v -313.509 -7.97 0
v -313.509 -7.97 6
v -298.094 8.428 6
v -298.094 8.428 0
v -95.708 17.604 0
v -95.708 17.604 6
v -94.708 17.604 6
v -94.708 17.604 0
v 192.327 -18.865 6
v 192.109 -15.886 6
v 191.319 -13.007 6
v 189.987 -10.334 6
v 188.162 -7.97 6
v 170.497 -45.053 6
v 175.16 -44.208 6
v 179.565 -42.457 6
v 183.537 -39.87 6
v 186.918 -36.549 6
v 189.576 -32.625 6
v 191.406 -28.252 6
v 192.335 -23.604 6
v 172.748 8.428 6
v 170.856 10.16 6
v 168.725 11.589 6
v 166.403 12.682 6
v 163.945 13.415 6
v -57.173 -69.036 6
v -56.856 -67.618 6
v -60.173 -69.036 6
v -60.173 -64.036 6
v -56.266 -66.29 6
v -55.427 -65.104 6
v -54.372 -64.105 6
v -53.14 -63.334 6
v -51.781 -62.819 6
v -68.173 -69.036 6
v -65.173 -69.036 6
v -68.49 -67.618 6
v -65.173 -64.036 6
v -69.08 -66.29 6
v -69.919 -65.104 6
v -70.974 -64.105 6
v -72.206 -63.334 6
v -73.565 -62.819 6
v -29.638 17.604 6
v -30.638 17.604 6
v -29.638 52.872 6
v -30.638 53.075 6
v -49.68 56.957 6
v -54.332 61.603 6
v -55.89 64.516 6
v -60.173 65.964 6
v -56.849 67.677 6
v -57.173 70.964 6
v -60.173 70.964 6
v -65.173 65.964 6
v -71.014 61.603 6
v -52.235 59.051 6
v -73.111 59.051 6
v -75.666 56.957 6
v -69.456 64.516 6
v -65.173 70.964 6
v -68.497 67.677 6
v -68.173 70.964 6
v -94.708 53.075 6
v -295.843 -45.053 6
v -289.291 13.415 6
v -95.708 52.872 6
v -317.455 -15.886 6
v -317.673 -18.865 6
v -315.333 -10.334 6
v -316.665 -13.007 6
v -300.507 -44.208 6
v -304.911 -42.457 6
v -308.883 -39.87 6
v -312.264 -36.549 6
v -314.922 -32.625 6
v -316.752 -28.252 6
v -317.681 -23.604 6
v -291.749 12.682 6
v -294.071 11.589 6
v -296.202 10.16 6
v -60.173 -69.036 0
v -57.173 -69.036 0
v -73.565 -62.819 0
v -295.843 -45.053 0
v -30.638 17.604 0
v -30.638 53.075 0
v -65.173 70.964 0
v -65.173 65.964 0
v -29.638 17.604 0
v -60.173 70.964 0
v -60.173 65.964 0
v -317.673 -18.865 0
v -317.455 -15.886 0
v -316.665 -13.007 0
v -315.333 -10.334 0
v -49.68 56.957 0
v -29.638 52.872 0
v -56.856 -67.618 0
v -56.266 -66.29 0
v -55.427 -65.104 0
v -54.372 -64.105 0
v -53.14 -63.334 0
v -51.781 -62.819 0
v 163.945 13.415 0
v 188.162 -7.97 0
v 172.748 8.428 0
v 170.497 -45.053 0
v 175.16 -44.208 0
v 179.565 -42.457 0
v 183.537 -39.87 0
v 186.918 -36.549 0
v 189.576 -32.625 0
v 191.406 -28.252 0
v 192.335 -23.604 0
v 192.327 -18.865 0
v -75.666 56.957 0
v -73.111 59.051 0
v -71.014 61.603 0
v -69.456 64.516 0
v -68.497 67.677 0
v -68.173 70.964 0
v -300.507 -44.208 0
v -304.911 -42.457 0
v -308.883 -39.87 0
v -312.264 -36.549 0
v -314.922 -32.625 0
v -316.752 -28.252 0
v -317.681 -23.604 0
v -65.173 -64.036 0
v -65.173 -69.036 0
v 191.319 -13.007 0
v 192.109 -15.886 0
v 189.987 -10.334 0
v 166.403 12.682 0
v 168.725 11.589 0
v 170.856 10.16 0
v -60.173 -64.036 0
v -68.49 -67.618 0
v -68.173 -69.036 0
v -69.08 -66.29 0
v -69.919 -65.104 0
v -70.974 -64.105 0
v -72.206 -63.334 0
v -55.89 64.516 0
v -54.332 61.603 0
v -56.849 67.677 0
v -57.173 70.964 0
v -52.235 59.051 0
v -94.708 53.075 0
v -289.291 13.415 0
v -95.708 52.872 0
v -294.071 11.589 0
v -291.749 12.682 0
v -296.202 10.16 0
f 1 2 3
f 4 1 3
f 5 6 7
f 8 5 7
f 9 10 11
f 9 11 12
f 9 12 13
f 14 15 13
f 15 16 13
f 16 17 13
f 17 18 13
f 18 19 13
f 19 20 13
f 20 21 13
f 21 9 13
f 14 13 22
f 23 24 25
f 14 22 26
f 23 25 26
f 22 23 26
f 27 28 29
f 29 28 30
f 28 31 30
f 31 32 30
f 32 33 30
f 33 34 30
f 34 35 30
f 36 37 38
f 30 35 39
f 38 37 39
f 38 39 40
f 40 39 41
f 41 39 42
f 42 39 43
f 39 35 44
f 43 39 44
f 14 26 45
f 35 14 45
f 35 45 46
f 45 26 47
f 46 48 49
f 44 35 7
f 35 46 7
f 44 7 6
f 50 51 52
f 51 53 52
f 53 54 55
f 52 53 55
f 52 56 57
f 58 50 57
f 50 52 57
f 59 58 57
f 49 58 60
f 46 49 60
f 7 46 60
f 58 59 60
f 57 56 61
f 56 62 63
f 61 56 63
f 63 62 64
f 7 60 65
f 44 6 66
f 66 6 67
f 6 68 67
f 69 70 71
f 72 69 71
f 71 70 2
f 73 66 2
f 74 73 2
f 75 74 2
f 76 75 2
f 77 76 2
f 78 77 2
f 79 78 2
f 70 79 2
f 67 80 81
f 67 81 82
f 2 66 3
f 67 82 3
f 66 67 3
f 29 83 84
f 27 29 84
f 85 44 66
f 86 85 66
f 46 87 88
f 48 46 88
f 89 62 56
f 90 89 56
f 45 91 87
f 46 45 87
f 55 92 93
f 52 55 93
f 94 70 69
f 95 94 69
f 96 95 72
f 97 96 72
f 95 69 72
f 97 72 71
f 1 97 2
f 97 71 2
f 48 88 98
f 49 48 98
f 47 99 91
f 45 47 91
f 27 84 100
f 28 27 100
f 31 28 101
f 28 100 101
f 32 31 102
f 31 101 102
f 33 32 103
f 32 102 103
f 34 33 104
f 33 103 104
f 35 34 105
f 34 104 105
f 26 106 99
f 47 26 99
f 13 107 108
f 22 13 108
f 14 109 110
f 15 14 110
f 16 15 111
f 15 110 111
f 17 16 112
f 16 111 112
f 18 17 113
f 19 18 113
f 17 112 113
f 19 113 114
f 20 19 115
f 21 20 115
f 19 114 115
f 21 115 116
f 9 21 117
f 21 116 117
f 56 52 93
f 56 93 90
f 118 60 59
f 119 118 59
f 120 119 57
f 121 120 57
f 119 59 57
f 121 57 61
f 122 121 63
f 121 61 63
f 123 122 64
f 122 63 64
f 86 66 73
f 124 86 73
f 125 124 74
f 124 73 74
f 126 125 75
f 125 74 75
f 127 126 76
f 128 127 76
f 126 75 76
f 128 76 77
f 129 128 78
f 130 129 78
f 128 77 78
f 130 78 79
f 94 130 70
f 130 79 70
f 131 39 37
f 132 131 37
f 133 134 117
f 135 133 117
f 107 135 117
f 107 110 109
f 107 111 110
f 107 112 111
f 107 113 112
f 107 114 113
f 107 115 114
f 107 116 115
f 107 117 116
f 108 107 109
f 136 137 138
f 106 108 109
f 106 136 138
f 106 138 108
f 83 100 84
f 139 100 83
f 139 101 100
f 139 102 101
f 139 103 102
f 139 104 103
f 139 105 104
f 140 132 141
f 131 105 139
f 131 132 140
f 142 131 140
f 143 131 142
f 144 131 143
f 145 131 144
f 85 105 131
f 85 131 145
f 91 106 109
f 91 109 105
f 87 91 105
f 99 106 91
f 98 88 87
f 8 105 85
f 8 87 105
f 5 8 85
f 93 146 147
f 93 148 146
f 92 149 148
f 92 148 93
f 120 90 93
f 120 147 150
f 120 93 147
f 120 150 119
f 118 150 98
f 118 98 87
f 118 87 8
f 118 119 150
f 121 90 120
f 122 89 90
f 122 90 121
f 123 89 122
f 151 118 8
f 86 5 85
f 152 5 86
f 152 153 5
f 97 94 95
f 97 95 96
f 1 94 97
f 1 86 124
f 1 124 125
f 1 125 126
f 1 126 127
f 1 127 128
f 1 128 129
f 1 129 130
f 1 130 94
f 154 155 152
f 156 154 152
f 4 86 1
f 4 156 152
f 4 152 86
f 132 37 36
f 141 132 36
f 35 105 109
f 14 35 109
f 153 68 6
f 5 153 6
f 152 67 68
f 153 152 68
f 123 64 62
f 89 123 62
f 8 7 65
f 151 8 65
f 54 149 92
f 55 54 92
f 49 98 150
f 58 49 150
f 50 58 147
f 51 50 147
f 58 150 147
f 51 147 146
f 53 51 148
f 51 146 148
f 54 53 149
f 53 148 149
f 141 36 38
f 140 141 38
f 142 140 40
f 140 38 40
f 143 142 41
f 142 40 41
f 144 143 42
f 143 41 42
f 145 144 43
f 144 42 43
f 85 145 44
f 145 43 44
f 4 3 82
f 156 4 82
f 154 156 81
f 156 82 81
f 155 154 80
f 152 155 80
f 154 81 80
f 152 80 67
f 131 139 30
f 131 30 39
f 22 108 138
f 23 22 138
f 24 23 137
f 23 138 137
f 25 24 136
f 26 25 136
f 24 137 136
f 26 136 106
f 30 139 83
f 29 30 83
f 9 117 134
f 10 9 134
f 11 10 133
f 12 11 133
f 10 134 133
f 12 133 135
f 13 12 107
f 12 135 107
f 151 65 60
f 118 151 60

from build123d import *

# Parameters (mm, degrees)
F0_W     = 2.5
F0_H     = 84.828298
F0_H_2   = 45.171702
F1_DEPTH = 6
F3_COUNT = 2
F3_ANGLE = 180


with BuildPart() as f1:
    # F0 (on Top) → F1 (new body)
    with BuildSketch(Plane.XY):
        with BuildLine():
            Line((192.326957, -18.864548), (-57.173043, -18.864548))
            Line((-57.173043, -18.864548), (-57.173043, -69.03625))
            ThreePointArc((-57.173043, -69.03625), (-55.427418, -65.103617), (-51.781147, -62.819426))
            Line((-51.781147, -62.819426), (170.496624, -45.052804))
            ThreePointArc((170.496624, -45.052804), (186.918172, -36.548754), (192.326957, -18.864548))
        make_face()
        Polygon((-60.173043, -18.864548), (-57.173043, -18.864548), (-57.173043, 70.96375), (-60.173043, 70.96375), (-60.173043, 65.96375), align=None)
        with Locations((-61.423043, 23.549601)):
            Rectangle(F0_W, F0_H)
        Polygon((-57.173043, -69.03625), (-57.173043, -18.864548), (-60.173043, -18.864548), (-60.173043, -64.03625), (-60.173043, -69.03625), align=None)
        with Locations((-61.423043, -41.450399)):
            Rectangle(F0_W, F0_H_2)
        with BuildLine():
            Line((-57.173043, 70.96375), (-57.173043, -18.864548))
            Line((-57.173043, -18.864548), (192.326957, -18.864548))
            ThreePointArc((192.326957, -18.864548), (191.318788, -13.006753), (188.162474, -7.970102))
            Line((188.162474, -7.970102), (-29.638024, 17.603921))
            Line((-29.638024, 17.603921), (-30.638024, 17.603921))
            Line((-30.638024, 17.603921), (-30.638024, 53.075382))
            Line((-30.638024, 53.075382), (-49.68049, 56.956703))
            ThreePointArc((-49.68049, 56.956703), (-55.182221, 63.02121), (-57.173043, 70.96375))
        make_face()
        with BuildLine():
            Line((-29.638024, 17.603921), (188.162474, -7.970102))
            Line((188.162474, -7.970102), (172.748387, 8.427883))
            ThreePointArc((172.748387, 8.427883), (168.724522, 11.588688), (163.944572, 13.414685))
            Line((163.944572, 13.414685), (-29.638024, 52.871558))
            Line((-29.638024, 52.871558), (-29.638024, 17.603921))
        make_face()
    extrude(amount=F1_DEPTH)

    # F3: F1 ×2 about axis
    f3_axis = Axis((-62.673043, 0.96375, 3), (0, -1, 0))


with BuildPart() as f1_1:
    add(f1.part)
    for i in range(1, F3_COUNT):
        add(f1.part.rotate(f3_axis, i * F3_ANGLE / (F3_COUNT - 1)))


solid = f1_1.part
